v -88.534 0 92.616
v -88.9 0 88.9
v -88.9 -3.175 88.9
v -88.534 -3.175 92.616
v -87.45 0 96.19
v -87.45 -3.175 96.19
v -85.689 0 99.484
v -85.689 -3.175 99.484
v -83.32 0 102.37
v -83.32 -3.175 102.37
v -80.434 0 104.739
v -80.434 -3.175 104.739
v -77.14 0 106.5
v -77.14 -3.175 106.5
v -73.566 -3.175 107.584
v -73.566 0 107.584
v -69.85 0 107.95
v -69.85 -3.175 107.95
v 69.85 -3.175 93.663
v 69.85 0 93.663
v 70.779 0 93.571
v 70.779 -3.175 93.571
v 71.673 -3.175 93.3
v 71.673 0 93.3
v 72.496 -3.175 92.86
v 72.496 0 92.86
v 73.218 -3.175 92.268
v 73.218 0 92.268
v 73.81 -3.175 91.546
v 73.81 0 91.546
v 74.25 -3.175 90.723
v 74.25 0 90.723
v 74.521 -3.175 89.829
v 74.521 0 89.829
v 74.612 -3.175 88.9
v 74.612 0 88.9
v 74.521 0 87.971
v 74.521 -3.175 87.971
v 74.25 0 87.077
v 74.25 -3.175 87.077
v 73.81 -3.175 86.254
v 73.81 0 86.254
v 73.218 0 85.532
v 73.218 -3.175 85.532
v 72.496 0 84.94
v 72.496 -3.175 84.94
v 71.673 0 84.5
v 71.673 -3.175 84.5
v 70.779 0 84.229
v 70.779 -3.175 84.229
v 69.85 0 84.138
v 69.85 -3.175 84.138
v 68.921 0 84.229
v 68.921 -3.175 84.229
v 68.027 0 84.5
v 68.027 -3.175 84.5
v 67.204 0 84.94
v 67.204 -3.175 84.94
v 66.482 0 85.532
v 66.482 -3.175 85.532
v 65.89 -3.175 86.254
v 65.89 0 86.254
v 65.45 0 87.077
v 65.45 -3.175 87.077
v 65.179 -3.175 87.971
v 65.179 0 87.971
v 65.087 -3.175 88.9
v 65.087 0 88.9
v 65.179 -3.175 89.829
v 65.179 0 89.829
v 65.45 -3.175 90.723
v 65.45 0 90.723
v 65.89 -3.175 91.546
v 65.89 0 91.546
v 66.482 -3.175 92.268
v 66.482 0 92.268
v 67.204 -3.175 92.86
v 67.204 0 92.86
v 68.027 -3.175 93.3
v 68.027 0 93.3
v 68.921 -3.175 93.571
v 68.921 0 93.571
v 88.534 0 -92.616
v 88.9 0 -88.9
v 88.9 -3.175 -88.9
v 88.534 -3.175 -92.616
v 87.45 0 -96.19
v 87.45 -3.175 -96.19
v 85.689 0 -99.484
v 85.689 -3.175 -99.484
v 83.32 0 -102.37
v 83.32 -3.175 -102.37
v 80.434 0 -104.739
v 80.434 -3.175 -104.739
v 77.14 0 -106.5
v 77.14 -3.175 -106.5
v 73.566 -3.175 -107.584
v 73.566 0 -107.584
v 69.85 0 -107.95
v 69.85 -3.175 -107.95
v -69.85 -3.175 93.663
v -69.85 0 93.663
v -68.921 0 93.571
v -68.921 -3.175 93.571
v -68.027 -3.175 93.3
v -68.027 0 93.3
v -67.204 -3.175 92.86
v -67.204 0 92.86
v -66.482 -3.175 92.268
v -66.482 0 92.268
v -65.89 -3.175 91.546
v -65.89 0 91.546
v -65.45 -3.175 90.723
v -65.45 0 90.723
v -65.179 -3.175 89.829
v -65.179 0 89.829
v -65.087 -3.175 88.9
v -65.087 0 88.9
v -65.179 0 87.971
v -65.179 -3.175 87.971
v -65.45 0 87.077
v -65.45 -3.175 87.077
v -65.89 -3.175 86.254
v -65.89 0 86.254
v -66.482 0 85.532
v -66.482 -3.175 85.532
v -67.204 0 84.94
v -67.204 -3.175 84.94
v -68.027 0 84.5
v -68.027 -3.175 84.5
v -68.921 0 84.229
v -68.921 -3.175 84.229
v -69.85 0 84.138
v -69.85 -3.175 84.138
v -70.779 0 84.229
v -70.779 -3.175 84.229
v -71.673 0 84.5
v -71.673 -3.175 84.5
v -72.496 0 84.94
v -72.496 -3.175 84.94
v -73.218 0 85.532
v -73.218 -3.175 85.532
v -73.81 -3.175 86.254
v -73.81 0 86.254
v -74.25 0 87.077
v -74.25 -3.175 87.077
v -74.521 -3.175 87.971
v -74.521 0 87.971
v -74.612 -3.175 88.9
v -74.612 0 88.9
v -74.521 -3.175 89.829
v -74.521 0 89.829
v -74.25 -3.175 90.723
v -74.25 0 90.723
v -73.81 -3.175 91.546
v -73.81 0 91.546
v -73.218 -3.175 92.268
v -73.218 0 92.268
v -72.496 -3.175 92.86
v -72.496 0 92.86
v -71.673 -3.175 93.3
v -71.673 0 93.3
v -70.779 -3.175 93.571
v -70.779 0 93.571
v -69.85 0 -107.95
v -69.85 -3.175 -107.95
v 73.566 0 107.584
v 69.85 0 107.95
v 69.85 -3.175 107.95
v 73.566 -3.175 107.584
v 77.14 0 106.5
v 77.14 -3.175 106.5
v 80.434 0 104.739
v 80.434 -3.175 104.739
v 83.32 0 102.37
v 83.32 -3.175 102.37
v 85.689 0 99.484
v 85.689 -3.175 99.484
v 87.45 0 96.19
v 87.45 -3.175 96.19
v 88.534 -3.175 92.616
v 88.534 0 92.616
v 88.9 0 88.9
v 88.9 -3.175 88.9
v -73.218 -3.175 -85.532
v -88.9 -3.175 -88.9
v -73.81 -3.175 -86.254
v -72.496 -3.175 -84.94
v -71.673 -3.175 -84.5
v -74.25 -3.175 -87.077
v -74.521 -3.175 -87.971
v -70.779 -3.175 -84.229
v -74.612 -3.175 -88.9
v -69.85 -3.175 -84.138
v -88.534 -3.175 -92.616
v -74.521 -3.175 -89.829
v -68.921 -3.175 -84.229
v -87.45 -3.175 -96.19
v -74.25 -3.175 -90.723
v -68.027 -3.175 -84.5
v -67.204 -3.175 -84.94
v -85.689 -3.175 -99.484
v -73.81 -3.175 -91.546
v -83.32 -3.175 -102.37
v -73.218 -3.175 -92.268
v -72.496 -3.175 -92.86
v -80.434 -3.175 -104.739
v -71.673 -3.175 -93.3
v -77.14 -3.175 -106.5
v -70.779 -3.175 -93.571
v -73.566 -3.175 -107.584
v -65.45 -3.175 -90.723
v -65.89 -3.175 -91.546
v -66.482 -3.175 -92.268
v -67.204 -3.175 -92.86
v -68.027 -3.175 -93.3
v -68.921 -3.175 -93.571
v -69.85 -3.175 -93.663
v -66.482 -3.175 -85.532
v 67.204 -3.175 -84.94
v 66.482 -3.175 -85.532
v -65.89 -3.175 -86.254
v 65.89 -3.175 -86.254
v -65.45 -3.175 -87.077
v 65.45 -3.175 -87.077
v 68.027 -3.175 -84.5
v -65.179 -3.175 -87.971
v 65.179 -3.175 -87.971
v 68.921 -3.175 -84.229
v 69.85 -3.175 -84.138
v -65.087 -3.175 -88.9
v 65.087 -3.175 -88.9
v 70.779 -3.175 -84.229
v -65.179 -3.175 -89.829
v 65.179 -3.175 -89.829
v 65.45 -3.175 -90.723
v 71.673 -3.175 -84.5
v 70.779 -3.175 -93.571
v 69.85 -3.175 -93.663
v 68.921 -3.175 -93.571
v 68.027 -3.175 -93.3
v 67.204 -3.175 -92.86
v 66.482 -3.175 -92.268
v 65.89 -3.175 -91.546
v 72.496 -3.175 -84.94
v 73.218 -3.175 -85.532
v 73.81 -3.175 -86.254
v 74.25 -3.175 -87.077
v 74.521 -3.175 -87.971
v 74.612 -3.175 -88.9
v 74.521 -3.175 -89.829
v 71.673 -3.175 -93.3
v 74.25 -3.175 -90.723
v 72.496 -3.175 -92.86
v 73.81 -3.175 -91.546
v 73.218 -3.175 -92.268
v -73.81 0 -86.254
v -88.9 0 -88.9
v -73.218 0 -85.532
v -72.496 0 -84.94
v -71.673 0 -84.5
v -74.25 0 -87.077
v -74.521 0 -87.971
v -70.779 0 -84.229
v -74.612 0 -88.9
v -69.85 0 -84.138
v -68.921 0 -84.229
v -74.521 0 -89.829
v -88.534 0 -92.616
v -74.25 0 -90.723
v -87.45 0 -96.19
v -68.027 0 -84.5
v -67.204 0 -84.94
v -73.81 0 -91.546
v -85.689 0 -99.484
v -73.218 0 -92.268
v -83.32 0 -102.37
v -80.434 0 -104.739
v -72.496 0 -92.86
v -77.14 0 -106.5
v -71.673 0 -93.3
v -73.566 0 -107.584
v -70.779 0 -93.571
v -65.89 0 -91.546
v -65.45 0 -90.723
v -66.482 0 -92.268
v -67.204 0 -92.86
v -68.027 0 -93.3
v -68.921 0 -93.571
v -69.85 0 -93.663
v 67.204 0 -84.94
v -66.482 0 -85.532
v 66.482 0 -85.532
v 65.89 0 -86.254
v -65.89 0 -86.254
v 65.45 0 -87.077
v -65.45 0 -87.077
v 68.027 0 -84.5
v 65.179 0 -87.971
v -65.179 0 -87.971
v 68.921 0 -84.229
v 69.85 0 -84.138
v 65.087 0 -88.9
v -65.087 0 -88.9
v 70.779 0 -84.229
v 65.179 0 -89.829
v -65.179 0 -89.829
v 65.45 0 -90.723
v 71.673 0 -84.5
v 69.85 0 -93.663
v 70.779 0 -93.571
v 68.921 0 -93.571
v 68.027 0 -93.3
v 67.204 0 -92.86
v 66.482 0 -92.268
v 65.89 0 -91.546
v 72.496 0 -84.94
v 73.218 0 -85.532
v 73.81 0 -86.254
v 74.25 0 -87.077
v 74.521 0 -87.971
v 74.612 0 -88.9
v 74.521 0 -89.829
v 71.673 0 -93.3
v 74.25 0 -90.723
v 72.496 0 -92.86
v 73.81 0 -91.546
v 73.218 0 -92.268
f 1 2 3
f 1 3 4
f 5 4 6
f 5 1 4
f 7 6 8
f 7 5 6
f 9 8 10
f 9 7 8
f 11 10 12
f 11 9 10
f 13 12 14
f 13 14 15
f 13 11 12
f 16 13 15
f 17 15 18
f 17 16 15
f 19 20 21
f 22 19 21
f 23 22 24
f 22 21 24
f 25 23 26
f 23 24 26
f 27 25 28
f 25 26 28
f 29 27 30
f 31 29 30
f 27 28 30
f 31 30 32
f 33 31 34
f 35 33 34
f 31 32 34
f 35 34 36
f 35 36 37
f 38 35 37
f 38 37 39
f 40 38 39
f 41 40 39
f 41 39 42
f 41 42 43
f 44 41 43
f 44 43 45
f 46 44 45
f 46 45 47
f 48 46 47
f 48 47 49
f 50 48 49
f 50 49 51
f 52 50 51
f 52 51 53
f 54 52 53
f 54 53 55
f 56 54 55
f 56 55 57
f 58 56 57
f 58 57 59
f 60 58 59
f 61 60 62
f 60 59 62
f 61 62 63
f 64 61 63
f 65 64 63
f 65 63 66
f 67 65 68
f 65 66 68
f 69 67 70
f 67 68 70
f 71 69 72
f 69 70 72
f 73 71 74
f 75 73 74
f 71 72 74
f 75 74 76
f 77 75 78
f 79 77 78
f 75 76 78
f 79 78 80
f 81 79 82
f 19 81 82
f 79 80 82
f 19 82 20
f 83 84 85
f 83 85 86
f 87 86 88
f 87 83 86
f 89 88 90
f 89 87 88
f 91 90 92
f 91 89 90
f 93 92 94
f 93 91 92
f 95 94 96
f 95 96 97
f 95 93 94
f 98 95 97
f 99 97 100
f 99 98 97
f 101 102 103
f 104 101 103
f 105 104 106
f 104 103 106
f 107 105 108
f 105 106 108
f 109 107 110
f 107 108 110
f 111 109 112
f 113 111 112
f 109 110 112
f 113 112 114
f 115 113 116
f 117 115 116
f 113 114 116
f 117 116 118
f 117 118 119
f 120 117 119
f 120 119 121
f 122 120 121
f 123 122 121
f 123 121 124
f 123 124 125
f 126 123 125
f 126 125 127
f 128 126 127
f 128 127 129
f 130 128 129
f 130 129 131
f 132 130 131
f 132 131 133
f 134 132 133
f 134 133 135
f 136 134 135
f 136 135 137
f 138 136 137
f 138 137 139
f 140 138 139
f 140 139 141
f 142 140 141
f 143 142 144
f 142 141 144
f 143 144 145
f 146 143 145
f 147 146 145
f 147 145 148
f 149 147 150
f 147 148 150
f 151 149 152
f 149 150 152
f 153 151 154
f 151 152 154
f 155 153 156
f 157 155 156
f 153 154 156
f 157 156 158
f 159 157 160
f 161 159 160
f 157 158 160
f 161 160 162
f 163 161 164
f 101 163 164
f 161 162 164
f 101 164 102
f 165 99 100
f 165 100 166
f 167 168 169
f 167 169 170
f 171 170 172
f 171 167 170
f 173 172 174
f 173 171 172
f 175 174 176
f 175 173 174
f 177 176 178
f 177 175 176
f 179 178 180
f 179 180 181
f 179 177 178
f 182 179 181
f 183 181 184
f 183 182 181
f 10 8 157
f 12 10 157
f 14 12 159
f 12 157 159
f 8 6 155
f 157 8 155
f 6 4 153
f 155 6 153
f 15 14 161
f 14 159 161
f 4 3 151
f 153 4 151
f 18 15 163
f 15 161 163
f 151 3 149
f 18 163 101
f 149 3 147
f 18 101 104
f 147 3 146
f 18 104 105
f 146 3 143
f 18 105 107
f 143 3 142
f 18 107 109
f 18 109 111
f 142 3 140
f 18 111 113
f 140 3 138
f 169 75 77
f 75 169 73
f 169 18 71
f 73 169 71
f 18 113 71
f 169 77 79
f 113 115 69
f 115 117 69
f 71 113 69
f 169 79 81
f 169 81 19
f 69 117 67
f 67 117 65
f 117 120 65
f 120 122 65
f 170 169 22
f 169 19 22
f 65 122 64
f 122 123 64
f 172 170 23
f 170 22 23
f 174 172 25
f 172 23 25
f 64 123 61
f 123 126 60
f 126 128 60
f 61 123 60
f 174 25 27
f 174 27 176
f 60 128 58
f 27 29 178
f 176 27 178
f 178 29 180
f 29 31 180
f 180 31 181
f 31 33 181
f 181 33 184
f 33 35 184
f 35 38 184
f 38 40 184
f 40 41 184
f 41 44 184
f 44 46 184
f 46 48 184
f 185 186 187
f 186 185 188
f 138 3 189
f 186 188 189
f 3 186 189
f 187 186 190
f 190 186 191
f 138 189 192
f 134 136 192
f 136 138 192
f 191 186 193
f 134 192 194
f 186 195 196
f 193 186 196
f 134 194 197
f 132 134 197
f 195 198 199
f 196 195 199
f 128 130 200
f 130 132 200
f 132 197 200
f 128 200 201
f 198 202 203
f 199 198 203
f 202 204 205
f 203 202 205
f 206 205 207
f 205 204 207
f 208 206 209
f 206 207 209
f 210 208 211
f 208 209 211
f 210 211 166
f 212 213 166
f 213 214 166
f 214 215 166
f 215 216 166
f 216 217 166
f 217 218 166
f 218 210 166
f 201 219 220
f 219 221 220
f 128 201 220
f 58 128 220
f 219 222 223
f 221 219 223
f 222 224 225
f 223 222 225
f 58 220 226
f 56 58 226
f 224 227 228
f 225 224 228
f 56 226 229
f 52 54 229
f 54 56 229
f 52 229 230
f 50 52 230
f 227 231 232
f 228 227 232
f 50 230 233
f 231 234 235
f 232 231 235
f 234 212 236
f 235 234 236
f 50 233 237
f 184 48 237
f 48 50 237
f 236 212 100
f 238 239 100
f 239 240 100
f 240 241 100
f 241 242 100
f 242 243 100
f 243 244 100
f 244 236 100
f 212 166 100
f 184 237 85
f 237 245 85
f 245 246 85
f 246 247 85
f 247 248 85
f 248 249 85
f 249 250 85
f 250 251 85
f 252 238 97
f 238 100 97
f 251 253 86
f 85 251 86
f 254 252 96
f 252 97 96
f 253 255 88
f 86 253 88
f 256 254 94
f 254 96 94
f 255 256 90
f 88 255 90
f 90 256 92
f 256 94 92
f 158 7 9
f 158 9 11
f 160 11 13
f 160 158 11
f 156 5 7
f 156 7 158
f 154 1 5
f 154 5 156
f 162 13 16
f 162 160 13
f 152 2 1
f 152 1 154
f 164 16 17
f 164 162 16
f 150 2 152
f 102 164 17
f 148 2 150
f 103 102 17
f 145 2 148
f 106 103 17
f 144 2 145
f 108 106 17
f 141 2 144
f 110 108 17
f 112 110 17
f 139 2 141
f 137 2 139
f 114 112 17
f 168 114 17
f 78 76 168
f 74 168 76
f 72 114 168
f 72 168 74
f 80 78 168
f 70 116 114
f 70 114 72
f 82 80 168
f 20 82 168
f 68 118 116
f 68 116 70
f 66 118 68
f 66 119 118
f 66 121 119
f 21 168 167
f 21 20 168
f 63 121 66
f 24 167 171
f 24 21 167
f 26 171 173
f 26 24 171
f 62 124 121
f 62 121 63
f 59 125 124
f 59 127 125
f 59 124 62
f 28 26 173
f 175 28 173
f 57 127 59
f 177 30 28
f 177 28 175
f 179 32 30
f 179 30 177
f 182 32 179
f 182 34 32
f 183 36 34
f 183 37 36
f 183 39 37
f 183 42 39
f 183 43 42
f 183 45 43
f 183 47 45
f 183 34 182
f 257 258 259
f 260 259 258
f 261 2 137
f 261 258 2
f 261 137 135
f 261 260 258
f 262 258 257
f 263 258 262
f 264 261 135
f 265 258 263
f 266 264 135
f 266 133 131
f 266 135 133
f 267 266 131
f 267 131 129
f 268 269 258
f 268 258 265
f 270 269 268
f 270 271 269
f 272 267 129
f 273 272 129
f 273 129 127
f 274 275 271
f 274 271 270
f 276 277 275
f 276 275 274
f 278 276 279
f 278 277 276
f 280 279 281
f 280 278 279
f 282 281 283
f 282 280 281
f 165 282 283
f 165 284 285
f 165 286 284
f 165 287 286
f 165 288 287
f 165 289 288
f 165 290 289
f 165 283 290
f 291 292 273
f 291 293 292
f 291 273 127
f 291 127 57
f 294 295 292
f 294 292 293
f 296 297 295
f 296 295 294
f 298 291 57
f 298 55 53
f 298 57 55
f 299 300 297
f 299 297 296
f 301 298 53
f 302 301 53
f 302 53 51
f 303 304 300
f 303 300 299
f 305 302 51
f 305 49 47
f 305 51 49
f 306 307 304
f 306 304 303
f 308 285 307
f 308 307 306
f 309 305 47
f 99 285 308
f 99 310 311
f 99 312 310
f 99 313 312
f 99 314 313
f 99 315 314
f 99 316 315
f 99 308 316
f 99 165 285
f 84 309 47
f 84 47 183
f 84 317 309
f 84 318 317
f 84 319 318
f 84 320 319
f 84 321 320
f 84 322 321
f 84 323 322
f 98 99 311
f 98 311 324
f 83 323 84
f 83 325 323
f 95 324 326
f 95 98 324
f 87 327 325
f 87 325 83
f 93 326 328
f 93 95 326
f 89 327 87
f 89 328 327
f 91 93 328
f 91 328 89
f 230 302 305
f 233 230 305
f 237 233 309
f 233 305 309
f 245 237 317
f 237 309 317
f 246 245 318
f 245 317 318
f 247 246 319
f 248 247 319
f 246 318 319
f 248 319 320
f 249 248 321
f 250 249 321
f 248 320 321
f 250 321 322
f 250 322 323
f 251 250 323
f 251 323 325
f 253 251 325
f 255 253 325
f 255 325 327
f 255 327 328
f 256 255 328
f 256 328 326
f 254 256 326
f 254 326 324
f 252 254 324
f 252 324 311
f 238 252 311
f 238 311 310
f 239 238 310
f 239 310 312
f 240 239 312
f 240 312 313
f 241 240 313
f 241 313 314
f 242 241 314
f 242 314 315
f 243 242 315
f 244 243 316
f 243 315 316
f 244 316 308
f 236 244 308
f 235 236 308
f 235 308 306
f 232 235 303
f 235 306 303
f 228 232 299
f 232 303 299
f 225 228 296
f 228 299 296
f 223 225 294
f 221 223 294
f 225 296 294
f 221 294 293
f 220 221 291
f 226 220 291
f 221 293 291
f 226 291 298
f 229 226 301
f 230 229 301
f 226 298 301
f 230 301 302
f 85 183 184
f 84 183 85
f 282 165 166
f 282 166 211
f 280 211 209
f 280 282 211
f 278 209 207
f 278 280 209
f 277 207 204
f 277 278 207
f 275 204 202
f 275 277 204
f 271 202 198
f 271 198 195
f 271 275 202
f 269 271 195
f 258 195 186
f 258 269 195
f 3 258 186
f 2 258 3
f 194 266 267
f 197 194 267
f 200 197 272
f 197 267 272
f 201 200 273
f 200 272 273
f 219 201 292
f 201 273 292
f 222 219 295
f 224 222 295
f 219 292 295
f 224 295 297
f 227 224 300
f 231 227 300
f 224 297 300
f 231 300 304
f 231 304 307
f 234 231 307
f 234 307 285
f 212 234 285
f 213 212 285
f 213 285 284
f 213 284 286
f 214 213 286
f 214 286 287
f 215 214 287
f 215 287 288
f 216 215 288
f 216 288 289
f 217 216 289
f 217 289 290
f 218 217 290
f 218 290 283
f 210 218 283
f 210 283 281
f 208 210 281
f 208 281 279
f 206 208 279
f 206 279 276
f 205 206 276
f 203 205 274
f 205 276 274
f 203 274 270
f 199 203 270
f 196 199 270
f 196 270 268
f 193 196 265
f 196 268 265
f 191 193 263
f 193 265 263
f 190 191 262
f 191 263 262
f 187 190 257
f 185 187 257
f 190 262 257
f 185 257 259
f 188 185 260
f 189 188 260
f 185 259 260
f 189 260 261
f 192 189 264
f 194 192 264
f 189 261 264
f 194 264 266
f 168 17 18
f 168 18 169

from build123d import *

# Parameters (mm, degrees)
BASE_FLANGE1_DEPTH = 3.175
SKETCH6_R          = 4.7625
CUT_EXTRUDE1_DEPTH = 140.880281402


# Sheet-metal steps are written as plain solids
with BuildPart() as part:
    # Sketch1 → Base-Flange1 (new body)
    with BuildSketch(Plane(origin=(0, 0, 0), x_dir=(1, 0, 0), z_dir=(0, 1, 0))):
        with BuildLine():
            Line((-69.85, -107.95), (69.85, -107.95))
            ThreePointArc((69.85, -107.95), (83.320384182, -102.370384182), (88.9, -88.9))
            Line((88.9, -88.9), (88.9, 88.9))
            ThreePointArc((88.9, 88.9), (83.320384182, 102.370384182), (69.85, 107.95))
            Line((69.85, 107.95), (-69.85, 107.95))
            ThreePointArc((-69.85, 107.95), (-83.320384182, 102.370384182), (-88.9, 88.9))
            Line((-88.9, 88.9), (-88.9, -88.9))
            ThreePointArc((-88.9, -88.9), (-83.320384182, -102.370384182), (-69.85, -107.95))
        make_face()
    extrude(amount=-BASE_FLANGE1_DEPTH)

    # Sketch6 → Cut-Extrude1 (cut, through all)
    with BuildSketch(Plane(origin=(0, 0, 0), x_dir=(1, 0, 0), z_dir=(0, 1, 0))):
        with Locations(Location((-69.85, -88.9, 0), (0, 0, 270))):
            Circle(SKETCH6_R)
        with Locations(Location((69.85, -88.9, 0), (0, 0, 270))):
            Circle(SKETCH6_R)
        with Locations(Location((69.85, 88.9, 0), (0, 0, 270))):
            Circle(SKETCH6_R)
        with Locations(Location((-69.85, 88.9, 0), (0, 0, 270))):
            Circle(SKETCH6_R)
    extrude(amount=-CUT_EXTRUDE1_DEPTH, mode=Mode.SUBTRACT)


solid = part.part
